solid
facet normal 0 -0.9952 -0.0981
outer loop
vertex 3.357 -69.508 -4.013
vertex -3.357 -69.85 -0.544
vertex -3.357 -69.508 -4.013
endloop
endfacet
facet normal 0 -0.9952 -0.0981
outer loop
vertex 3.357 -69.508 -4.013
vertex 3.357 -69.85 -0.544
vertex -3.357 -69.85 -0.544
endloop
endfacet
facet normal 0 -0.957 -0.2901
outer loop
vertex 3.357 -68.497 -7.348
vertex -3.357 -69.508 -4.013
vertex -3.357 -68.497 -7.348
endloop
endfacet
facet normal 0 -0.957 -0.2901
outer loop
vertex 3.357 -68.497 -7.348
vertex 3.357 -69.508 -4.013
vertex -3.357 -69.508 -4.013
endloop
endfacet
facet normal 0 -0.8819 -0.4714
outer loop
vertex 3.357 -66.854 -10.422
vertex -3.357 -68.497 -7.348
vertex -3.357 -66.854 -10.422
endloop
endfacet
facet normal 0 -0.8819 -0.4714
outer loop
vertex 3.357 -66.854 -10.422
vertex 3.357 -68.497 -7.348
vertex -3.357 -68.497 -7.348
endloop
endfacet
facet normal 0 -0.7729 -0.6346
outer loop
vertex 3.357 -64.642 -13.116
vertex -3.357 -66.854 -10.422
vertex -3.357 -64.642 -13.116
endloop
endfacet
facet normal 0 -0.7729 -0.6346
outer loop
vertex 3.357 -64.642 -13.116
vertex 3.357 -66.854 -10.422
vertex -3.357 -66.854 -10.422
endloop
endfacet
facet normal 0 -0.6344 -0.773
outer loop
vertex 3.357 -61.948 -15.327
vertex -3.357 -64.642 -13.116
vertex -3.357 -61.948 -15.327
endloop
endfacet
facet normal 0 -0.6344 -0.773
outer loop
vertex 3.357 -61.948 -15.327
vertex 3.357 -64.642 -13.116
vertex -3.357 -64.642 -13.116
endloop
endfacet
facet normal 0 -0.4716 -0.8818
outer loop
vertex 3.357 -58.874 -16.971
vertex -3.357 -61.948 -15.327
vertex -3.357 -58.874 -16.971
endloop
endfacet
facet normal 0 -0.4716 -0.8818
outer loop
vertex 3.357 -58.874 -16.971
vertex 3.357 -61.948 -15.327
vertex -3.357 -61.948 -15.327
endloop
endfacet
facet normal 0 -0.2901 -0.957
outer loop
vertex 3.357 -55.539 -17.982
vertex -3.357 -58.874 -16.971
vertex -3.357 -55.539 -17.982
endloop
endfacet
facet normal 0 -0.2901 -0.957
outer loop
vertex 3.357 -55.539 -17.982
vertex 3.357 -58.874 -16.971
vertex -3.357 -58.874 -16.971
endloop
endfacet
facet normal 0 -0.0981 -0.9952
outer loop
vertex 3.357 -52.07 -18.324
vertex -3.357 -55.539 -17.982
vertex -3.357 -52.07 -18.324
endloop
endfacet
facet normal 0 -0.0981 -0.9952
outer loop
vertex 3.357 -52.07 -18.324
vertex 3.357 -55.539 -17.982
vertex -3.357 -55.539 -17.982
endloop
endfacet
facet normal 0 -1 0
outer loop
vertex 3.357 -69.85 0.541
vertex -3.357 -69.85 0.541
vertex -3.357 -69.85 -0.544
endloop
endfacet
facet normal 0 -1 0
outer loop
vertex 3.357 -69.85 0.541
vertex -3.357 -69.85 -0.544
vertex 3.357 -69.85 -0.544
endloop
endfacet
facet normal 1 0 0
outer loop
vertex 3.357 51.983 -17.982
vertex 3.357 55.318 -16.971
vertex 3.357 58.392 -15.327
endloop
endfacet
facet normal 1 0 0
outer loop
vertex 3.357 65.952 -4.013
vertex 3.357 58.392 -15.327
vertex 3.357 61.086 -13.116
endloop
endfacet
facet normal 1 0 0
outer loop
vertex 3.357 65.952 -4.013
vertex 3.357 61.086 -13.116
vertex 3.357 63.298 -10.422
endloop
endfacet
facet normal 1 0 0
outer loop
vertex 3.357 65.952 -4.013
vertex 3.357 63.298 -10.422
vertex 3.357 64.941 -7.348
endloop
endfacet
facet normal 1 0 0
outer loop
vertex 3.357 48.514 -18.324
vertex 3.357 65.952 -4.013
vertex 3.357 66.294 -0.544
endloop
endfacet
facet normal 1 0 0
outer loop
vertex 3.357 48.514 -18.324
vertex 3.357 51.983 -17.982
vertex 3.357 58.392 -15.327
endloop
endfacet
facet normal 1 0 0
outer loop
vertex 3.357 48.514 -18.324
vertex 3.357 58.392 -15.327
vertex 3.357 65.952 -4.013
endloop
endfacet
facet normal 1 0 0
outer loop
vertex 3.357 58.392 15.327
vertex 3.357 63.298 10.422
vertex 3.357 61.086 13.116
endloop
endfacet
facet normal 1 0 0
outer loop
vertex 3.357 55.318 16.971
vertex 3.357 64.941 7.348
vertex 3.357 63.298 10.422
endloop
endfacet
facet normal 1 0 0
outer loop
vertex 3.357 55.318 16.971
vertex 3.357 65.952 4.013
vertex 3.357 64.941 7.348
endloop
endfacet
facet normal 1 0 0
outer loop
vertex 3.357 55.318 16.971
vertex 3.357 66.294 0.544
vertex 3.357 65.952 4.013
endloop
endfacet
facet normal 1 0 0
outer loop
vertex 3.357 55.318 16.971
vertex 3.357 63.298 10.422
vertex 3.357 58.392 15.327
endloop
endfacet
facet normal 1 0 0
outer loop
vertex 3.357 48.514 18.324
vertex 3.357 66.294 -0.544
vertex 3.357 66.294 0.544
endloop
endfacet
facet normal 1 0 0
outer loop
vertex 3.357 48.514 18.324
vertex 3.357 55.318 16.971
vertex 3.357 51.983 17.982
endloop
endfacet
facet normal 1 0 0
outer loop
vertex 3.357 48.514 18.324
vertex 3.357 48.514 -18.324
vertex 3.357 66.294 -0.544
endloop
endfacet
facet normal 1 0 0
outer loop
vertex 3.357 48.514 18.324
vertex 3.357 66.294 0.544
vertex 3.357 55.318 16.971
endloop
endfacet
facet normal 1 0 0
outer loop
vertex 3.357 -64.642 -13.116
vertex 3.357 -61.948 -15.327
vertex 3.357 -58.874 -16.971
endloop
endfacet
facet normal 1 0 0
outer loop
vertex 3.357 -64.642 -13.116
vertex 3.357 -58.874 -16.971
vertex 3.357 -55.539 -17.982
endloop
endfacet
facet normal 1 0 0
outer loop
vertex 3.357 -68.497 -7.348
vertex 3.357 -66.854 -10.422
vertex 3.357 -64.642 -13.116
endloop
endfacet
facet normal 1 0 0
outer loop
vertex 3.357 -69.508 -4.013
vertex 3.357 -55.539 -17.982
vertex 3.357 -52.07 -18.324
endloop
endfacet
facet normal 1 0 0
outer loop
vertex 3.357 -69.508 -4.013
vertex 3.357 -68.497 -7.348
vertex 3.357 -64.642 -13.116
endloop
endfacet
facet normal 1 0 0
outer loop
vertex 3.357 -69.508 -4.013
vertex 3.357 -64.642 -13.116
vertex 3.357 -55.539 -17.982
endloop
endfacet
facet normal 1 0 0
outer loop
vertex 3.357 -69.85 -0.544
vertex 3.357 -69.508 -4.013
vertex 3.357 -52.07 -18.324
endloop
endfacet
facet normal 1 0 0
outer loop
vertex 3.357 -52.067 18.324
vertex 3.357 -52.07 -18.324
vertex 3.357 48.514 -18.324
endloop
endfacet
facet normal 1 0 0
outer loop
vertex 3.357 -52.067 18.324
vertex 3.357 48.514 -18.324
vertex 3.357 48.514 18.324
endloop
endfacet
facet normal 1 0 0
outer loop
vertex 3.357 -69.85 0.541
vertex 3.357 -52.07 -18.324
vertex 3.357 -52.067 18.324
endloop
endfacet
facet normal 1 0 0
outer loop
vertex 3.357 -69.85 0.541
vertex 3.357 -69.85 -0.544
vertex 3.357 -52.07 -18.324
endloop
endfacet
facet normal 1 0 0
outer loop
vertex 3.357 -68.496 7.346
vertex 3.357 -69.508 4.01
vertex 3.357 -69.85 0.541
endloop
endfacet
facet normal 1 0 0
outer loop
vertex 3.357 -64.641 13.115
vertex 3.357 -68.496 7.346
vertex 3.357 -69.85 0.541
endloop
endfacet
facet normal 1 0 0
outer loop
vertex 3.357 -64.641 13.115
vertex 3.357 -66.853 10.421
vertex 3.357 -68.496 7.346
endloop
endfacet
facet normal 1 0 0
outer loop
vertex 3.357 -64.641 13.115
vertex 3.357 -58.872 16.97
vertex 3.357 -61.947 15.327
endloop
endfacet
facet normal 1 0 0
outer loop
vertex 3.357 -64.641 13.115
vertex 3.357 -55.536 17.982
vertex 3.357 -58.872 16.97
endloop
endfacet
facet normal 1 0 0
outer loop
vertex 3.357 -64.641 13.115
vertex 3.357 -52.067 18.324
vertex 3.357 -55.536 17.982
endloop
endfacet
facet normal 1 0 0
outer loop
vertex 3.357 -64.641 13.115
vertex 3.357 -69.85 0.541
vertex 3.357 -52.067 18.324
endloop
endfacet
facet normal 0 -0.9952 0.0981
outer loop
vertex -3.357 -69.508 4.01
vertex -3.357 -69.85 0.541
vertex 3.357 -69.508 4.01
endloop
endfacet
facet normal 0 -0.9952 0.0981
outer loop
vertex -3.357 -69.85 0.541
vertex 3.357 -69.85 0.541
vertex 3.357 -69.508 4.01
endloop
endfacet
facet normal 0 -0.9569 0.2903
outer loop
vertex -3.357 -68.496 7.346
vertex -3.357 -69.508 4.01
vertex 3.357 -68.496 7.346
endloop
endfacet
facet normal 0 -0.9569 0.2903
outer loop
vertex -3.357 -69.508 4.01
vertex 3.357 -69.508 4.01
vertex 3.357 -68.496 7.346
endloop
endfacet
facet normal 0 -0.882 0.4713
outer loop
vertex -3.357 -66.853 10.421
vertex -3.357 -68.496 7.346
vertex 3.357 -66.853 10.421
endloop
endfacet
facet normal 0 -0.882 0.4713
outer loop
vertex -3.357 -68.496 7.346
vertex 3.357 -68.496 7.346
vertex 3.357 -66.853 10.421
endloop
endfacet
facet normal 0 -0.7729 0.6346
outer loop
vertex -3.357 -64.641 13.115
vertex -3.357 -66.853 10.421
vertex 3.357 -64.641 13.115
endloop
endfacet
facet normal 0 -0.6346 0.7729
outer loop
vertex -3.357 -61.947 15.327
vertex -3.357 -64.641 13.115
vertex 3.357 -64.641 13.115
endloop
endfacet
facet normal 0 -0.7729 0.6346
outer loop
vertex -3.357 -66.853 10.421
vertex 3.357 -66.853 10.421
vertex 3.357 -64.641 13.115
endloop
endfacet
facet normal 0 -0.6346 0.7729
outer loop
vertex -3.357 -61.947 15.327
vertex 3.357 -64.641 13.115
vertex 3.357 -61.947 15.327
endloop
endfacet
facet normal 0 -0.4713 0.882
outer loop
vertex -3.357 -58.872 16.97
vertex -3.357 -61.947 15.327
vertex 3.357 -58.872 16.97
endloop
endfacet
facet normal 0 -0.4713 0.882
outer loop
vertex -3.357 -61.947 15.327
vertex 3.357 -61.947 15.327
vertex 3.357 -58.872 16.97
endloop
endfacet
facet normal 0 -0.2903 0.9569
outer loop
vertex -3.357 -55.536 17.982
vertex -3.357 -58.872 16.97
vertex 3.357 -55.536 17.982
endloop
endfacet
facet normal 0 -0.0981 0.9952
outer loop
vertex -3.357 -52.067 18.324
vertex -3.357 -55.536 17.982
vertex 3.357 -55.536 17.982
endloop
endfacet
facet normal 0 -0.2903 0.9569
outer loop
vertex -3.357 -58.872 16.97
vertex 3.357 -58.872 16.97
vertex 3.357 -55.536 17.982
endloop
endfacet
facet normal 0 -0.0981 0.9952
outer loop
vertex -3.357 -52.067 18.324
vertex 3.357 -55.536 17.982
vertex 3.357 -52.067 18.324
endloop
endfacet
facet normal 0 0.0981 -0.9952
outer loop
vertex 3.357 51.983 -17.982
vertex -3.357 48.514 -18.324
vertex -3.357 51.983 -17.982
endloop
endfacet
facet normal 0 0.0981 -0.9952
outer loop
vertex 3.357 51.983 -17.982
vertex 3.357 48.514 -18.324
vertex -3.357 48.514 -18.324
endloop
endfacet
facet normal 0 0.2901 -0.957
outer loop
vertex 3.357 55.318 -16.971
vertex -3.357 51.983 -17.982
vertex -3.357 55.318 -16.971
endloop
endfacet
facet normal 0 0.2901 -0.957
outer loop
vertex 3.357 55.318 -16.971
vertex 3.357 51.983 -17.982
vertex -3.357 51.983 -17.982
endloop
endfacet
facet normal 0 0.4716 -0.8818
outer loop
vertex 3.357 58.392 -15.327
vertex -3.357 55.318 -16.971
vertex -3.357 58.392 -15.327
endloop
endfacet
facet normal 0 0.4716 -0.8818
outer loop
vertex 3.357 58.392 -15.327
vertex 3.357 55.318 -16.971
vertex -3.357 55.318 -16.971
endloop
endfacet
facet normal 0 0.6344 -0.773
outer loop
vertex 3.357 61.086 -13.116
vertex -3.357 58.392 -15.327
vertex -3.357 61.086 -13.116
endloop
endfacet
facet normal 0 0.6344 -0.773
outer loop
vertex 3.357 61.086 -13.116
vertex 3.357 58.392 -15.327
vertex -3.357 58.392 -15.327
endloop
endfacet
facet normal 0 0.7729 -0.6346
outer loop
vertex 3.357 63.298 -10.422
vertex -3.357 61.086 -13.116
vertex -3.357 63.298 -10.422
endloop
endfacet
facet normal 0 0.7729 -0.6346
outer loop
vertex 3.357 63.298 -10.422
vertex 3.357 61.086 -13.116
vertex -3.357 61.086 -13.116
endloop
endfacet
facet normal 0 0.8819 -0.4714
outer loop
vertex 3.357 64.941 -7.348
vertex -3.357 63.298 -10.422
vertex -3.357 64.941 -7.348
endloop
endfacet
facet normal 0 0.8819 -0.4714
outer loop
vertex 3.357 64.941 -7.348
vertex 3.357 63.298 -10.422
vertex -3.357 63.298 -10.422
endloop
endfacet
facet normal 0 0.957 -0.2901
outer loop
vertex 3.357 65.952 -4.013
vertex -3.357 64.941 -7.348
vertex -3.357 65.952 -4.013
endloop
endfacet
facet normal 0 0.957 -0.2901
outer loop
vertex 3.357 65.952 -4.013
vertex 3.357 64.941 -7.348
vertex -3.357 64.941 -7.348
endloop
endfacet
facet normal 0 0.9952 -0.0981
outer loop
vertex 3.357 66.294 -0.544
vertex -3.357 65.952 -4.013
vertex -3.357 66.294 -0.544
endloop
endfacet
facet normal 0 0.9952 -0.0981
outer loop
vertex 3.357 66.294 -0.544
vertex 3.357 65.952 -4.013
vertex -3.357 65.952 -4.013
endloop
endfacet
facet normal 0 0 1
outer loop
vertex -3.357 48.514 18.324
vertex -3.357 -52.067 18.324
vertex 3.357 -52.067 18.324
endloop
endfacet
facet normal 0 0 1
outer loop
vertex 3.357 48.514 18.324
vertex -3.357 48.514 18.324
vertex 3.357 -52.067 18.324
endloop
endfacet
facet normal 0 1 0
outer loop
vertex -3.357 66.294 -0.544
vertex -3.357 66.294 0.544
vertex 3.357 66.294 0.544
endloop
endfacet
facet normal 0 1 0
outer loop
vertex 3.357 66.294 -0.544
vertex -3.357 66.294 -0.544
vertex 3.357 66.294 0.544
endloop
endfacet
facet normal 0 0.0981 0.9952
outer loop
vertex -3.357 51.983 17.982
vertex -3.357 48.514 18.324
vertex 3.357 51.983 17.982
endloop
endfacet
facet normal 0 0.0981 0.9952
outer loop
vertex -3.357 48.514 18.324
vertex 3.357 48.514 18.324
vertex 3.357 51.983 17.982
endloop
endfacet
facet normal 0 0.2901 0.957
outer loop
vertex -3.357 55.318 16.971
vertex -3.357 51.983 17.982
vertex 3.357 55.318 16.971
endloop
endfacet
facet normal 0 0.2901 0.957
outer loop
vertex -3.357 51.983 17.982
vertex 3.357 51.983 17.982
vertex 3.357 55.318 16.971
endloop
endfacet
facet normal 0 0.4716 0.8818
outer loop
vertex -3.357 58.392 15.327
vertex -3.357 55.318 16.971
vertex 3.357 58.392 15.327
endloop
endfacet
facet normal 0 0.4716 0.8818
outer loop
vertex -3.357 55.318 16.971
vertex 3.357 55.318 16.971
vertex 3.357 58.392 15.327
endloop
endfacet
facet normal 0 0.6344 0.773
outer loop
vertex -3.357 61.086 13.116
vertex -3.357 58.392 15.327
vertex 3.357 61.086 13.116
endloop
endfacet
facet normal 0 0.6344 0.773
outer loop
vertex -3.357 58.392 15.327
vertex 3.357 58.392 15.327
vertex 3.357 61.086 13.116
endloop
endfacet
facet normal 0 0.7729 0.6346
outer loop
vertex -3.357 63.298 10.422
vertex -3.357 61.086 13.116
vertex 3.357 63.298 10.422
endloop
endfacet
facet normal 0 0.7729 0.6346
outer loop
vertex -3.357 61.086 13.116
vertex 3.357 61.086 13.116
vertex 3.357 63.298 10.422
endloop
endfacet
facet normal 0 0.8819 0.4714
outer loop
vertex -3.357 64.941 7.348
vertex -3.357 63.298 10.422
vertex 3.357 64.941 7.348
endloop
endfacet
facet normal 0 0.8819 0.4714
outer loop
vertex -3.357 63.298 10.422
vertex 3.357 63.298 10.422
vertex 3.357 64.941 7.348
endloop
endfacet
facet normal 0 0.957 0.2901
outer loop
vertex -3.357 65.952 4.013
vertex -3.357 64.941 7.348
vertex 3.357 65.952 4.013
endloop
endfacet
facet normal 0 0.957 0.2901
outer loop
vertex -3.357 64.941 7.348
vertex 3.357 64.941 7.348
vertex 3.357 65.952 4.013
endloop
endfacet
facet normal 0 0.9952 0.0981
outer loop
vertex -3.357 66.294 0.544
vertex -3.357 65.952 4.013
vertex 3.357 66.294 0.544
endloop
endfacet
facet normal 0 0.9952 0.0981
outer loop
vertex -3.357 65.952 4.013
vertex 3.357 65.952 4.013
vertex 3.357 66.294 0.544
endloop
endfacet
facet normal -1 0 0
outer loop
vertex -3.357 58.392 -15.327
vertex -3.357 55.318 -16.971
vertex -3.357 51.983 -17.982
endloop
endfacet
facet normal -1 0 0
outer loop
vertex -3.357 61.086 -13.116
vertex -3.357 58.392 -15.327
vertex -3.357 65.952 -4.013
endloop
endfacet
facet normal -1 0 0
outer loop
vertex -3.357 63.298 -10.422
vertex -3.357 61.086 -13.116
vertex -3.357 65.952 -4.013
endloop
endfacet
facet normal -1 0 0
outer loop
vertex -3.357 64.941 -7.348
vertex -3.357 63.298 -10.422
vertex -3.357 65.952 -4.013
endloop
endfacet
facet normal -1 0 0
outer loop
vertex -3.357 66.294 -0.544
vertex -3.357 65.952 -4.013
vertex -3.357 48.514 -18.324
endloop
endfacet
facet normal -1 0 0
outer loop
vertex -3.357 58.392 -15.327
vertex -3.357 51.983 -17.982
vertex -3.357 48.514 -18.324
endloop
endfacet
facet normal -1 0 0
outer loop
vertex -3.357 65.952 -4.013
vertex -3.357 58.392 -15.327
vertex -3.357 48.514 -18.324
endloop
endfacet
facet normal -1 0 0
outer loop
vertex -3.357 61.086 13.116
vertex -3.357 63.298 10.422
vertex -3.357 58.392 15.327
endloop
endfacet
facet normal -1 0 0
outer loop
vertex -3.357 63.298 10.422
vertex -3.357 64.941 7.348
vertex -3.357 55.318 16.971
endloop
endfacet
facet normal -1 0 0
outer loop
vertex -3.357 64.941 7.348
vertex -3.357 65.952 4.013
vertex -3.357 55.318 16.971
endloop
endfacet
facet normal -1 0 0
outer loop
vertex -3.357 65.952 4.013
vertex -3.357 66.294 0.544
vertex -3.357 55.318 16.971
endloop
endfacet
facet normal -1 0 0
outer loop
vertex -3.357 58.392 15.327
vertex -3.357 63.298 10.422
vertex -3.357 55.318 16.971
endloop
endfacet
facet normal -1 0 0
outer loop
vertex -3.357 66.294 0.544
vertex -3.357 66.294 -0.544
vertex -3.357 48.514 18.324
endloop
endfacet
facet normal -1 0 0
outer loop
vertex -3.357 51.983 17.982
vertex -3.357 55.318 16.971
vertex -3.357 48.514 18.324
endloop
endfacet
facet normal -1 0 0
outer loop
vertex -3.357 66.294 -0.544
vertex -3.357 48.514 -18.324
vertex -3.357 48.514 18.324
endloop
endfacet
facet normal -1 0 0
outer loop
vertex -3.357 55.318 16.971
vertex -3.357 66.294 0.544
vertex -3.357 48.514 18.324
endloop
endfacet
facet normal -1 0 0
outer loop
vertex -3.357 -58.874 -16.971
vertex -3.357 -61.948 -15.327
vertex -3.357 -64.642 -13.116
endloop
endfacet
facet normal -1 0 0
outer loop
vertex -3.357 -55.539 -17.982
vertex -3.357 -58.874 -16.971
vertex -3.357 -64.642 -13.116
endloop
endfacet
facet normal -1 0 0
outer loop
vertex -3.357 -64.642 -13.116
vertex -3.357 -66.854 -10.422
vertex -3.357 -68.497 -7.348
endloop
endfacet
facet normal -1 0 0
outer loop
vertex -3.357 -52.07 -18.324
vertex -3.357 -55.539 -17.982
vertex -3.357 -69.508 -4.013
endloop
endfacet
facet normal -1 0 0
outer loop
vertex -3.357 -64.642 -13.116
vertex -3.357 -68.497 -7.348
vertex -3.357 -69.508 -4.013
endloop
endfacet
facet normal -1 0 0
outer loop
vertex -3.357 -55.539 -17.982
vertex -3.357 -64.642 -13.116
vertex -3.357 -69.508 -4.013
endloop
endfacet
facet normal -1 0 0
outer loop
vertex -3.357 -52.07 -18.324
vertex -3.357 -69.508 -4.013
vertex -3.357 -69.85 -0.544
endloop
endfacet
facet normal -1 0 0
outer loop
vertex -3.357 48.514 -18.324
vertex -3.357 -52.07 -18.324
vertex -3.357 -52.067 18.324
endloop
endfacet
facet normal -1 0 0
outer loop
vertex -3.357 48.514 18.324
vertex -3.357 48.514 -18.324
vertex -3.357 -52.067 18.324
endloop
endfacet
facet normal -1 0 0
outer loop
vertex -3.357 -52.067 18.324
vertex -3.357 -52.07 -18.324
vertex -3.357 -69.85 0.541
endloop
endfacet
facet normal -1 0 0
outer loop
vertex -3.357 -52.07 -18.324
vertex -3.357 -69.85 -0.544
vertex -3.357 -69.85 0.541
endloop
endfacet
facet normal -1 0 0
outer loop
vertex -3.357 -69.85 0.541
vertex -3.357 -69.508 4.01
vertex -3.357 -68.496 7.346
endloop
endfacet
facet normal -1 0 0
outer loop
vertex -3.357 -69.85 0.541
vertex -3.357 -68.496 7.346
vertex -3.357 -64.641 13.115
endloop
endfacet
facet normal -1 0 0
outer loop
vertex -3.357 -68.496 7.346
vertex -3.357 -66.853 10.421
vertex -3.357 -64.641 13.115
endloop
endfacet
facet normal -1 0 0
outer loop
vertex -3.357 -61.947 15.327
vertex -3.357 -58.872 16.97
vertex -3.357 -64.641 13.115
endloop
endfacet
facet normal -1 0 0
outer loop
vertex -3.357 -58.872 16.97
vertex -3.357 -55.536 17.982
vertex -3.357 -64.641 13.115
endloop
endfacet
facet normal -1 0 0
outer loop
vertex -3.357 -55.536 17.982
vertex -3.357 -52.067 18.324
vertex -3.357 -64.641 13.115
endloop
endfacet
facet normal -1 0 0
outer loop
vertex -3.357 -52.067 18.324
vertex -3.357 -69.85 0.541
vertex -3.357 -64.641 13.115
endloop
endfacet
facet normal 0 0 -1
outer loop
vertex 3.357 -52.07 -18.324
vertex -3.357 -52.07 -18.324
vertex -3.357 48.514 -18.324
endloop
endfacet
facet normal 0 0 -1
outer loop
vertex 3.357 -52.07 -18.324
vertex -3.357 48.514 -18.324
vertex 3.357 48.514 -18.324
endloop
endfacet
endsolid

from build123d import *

# Parameters (mm, degrees)
F0_W          = 6.714124
F0_H          = 36.647938
F1_DEPTH      = 69.85
F1_DEPTH_BACK = 66.294
F2_R          = 17.783097
F3_R          = 17.78
F4_R          = 17.78


with BuildPart() as f1:
    # F0 (on Front) → F1 (new body, two sides)
    with BuildSketch(Plane.XZ) as f1_sk:
        Rectangle(F0_W, F0_H)
    extrude(amount=F1_DEPTH)
    extrude(f1_sk.sketch, amount=-F1_DEPTH_BACK)

    # F2
    f2_edges = [f1.edges().sort_by_distance(p)[0] for p in [
        (0, -69.85, 18.323969),
    ]]
    fillet(f2_edges, radius=F2_R)

    # F3
    f3_edges = [f1.edges().sort_by_distance(p)[0] for p in [
        (0, -69.85, -18.323969),
    ]]
    fillet(f3_edges, radius=F3_R)

    # F4
    f4_edges = [f1.edges().sort_by_distance(p)[0] for p in [
        (0, 66.294, -18.323969),
        (0, 66.294, 18.323969),
    ]]
    fillet(f4_edges, radius=F4_R)


solid = f1.part
